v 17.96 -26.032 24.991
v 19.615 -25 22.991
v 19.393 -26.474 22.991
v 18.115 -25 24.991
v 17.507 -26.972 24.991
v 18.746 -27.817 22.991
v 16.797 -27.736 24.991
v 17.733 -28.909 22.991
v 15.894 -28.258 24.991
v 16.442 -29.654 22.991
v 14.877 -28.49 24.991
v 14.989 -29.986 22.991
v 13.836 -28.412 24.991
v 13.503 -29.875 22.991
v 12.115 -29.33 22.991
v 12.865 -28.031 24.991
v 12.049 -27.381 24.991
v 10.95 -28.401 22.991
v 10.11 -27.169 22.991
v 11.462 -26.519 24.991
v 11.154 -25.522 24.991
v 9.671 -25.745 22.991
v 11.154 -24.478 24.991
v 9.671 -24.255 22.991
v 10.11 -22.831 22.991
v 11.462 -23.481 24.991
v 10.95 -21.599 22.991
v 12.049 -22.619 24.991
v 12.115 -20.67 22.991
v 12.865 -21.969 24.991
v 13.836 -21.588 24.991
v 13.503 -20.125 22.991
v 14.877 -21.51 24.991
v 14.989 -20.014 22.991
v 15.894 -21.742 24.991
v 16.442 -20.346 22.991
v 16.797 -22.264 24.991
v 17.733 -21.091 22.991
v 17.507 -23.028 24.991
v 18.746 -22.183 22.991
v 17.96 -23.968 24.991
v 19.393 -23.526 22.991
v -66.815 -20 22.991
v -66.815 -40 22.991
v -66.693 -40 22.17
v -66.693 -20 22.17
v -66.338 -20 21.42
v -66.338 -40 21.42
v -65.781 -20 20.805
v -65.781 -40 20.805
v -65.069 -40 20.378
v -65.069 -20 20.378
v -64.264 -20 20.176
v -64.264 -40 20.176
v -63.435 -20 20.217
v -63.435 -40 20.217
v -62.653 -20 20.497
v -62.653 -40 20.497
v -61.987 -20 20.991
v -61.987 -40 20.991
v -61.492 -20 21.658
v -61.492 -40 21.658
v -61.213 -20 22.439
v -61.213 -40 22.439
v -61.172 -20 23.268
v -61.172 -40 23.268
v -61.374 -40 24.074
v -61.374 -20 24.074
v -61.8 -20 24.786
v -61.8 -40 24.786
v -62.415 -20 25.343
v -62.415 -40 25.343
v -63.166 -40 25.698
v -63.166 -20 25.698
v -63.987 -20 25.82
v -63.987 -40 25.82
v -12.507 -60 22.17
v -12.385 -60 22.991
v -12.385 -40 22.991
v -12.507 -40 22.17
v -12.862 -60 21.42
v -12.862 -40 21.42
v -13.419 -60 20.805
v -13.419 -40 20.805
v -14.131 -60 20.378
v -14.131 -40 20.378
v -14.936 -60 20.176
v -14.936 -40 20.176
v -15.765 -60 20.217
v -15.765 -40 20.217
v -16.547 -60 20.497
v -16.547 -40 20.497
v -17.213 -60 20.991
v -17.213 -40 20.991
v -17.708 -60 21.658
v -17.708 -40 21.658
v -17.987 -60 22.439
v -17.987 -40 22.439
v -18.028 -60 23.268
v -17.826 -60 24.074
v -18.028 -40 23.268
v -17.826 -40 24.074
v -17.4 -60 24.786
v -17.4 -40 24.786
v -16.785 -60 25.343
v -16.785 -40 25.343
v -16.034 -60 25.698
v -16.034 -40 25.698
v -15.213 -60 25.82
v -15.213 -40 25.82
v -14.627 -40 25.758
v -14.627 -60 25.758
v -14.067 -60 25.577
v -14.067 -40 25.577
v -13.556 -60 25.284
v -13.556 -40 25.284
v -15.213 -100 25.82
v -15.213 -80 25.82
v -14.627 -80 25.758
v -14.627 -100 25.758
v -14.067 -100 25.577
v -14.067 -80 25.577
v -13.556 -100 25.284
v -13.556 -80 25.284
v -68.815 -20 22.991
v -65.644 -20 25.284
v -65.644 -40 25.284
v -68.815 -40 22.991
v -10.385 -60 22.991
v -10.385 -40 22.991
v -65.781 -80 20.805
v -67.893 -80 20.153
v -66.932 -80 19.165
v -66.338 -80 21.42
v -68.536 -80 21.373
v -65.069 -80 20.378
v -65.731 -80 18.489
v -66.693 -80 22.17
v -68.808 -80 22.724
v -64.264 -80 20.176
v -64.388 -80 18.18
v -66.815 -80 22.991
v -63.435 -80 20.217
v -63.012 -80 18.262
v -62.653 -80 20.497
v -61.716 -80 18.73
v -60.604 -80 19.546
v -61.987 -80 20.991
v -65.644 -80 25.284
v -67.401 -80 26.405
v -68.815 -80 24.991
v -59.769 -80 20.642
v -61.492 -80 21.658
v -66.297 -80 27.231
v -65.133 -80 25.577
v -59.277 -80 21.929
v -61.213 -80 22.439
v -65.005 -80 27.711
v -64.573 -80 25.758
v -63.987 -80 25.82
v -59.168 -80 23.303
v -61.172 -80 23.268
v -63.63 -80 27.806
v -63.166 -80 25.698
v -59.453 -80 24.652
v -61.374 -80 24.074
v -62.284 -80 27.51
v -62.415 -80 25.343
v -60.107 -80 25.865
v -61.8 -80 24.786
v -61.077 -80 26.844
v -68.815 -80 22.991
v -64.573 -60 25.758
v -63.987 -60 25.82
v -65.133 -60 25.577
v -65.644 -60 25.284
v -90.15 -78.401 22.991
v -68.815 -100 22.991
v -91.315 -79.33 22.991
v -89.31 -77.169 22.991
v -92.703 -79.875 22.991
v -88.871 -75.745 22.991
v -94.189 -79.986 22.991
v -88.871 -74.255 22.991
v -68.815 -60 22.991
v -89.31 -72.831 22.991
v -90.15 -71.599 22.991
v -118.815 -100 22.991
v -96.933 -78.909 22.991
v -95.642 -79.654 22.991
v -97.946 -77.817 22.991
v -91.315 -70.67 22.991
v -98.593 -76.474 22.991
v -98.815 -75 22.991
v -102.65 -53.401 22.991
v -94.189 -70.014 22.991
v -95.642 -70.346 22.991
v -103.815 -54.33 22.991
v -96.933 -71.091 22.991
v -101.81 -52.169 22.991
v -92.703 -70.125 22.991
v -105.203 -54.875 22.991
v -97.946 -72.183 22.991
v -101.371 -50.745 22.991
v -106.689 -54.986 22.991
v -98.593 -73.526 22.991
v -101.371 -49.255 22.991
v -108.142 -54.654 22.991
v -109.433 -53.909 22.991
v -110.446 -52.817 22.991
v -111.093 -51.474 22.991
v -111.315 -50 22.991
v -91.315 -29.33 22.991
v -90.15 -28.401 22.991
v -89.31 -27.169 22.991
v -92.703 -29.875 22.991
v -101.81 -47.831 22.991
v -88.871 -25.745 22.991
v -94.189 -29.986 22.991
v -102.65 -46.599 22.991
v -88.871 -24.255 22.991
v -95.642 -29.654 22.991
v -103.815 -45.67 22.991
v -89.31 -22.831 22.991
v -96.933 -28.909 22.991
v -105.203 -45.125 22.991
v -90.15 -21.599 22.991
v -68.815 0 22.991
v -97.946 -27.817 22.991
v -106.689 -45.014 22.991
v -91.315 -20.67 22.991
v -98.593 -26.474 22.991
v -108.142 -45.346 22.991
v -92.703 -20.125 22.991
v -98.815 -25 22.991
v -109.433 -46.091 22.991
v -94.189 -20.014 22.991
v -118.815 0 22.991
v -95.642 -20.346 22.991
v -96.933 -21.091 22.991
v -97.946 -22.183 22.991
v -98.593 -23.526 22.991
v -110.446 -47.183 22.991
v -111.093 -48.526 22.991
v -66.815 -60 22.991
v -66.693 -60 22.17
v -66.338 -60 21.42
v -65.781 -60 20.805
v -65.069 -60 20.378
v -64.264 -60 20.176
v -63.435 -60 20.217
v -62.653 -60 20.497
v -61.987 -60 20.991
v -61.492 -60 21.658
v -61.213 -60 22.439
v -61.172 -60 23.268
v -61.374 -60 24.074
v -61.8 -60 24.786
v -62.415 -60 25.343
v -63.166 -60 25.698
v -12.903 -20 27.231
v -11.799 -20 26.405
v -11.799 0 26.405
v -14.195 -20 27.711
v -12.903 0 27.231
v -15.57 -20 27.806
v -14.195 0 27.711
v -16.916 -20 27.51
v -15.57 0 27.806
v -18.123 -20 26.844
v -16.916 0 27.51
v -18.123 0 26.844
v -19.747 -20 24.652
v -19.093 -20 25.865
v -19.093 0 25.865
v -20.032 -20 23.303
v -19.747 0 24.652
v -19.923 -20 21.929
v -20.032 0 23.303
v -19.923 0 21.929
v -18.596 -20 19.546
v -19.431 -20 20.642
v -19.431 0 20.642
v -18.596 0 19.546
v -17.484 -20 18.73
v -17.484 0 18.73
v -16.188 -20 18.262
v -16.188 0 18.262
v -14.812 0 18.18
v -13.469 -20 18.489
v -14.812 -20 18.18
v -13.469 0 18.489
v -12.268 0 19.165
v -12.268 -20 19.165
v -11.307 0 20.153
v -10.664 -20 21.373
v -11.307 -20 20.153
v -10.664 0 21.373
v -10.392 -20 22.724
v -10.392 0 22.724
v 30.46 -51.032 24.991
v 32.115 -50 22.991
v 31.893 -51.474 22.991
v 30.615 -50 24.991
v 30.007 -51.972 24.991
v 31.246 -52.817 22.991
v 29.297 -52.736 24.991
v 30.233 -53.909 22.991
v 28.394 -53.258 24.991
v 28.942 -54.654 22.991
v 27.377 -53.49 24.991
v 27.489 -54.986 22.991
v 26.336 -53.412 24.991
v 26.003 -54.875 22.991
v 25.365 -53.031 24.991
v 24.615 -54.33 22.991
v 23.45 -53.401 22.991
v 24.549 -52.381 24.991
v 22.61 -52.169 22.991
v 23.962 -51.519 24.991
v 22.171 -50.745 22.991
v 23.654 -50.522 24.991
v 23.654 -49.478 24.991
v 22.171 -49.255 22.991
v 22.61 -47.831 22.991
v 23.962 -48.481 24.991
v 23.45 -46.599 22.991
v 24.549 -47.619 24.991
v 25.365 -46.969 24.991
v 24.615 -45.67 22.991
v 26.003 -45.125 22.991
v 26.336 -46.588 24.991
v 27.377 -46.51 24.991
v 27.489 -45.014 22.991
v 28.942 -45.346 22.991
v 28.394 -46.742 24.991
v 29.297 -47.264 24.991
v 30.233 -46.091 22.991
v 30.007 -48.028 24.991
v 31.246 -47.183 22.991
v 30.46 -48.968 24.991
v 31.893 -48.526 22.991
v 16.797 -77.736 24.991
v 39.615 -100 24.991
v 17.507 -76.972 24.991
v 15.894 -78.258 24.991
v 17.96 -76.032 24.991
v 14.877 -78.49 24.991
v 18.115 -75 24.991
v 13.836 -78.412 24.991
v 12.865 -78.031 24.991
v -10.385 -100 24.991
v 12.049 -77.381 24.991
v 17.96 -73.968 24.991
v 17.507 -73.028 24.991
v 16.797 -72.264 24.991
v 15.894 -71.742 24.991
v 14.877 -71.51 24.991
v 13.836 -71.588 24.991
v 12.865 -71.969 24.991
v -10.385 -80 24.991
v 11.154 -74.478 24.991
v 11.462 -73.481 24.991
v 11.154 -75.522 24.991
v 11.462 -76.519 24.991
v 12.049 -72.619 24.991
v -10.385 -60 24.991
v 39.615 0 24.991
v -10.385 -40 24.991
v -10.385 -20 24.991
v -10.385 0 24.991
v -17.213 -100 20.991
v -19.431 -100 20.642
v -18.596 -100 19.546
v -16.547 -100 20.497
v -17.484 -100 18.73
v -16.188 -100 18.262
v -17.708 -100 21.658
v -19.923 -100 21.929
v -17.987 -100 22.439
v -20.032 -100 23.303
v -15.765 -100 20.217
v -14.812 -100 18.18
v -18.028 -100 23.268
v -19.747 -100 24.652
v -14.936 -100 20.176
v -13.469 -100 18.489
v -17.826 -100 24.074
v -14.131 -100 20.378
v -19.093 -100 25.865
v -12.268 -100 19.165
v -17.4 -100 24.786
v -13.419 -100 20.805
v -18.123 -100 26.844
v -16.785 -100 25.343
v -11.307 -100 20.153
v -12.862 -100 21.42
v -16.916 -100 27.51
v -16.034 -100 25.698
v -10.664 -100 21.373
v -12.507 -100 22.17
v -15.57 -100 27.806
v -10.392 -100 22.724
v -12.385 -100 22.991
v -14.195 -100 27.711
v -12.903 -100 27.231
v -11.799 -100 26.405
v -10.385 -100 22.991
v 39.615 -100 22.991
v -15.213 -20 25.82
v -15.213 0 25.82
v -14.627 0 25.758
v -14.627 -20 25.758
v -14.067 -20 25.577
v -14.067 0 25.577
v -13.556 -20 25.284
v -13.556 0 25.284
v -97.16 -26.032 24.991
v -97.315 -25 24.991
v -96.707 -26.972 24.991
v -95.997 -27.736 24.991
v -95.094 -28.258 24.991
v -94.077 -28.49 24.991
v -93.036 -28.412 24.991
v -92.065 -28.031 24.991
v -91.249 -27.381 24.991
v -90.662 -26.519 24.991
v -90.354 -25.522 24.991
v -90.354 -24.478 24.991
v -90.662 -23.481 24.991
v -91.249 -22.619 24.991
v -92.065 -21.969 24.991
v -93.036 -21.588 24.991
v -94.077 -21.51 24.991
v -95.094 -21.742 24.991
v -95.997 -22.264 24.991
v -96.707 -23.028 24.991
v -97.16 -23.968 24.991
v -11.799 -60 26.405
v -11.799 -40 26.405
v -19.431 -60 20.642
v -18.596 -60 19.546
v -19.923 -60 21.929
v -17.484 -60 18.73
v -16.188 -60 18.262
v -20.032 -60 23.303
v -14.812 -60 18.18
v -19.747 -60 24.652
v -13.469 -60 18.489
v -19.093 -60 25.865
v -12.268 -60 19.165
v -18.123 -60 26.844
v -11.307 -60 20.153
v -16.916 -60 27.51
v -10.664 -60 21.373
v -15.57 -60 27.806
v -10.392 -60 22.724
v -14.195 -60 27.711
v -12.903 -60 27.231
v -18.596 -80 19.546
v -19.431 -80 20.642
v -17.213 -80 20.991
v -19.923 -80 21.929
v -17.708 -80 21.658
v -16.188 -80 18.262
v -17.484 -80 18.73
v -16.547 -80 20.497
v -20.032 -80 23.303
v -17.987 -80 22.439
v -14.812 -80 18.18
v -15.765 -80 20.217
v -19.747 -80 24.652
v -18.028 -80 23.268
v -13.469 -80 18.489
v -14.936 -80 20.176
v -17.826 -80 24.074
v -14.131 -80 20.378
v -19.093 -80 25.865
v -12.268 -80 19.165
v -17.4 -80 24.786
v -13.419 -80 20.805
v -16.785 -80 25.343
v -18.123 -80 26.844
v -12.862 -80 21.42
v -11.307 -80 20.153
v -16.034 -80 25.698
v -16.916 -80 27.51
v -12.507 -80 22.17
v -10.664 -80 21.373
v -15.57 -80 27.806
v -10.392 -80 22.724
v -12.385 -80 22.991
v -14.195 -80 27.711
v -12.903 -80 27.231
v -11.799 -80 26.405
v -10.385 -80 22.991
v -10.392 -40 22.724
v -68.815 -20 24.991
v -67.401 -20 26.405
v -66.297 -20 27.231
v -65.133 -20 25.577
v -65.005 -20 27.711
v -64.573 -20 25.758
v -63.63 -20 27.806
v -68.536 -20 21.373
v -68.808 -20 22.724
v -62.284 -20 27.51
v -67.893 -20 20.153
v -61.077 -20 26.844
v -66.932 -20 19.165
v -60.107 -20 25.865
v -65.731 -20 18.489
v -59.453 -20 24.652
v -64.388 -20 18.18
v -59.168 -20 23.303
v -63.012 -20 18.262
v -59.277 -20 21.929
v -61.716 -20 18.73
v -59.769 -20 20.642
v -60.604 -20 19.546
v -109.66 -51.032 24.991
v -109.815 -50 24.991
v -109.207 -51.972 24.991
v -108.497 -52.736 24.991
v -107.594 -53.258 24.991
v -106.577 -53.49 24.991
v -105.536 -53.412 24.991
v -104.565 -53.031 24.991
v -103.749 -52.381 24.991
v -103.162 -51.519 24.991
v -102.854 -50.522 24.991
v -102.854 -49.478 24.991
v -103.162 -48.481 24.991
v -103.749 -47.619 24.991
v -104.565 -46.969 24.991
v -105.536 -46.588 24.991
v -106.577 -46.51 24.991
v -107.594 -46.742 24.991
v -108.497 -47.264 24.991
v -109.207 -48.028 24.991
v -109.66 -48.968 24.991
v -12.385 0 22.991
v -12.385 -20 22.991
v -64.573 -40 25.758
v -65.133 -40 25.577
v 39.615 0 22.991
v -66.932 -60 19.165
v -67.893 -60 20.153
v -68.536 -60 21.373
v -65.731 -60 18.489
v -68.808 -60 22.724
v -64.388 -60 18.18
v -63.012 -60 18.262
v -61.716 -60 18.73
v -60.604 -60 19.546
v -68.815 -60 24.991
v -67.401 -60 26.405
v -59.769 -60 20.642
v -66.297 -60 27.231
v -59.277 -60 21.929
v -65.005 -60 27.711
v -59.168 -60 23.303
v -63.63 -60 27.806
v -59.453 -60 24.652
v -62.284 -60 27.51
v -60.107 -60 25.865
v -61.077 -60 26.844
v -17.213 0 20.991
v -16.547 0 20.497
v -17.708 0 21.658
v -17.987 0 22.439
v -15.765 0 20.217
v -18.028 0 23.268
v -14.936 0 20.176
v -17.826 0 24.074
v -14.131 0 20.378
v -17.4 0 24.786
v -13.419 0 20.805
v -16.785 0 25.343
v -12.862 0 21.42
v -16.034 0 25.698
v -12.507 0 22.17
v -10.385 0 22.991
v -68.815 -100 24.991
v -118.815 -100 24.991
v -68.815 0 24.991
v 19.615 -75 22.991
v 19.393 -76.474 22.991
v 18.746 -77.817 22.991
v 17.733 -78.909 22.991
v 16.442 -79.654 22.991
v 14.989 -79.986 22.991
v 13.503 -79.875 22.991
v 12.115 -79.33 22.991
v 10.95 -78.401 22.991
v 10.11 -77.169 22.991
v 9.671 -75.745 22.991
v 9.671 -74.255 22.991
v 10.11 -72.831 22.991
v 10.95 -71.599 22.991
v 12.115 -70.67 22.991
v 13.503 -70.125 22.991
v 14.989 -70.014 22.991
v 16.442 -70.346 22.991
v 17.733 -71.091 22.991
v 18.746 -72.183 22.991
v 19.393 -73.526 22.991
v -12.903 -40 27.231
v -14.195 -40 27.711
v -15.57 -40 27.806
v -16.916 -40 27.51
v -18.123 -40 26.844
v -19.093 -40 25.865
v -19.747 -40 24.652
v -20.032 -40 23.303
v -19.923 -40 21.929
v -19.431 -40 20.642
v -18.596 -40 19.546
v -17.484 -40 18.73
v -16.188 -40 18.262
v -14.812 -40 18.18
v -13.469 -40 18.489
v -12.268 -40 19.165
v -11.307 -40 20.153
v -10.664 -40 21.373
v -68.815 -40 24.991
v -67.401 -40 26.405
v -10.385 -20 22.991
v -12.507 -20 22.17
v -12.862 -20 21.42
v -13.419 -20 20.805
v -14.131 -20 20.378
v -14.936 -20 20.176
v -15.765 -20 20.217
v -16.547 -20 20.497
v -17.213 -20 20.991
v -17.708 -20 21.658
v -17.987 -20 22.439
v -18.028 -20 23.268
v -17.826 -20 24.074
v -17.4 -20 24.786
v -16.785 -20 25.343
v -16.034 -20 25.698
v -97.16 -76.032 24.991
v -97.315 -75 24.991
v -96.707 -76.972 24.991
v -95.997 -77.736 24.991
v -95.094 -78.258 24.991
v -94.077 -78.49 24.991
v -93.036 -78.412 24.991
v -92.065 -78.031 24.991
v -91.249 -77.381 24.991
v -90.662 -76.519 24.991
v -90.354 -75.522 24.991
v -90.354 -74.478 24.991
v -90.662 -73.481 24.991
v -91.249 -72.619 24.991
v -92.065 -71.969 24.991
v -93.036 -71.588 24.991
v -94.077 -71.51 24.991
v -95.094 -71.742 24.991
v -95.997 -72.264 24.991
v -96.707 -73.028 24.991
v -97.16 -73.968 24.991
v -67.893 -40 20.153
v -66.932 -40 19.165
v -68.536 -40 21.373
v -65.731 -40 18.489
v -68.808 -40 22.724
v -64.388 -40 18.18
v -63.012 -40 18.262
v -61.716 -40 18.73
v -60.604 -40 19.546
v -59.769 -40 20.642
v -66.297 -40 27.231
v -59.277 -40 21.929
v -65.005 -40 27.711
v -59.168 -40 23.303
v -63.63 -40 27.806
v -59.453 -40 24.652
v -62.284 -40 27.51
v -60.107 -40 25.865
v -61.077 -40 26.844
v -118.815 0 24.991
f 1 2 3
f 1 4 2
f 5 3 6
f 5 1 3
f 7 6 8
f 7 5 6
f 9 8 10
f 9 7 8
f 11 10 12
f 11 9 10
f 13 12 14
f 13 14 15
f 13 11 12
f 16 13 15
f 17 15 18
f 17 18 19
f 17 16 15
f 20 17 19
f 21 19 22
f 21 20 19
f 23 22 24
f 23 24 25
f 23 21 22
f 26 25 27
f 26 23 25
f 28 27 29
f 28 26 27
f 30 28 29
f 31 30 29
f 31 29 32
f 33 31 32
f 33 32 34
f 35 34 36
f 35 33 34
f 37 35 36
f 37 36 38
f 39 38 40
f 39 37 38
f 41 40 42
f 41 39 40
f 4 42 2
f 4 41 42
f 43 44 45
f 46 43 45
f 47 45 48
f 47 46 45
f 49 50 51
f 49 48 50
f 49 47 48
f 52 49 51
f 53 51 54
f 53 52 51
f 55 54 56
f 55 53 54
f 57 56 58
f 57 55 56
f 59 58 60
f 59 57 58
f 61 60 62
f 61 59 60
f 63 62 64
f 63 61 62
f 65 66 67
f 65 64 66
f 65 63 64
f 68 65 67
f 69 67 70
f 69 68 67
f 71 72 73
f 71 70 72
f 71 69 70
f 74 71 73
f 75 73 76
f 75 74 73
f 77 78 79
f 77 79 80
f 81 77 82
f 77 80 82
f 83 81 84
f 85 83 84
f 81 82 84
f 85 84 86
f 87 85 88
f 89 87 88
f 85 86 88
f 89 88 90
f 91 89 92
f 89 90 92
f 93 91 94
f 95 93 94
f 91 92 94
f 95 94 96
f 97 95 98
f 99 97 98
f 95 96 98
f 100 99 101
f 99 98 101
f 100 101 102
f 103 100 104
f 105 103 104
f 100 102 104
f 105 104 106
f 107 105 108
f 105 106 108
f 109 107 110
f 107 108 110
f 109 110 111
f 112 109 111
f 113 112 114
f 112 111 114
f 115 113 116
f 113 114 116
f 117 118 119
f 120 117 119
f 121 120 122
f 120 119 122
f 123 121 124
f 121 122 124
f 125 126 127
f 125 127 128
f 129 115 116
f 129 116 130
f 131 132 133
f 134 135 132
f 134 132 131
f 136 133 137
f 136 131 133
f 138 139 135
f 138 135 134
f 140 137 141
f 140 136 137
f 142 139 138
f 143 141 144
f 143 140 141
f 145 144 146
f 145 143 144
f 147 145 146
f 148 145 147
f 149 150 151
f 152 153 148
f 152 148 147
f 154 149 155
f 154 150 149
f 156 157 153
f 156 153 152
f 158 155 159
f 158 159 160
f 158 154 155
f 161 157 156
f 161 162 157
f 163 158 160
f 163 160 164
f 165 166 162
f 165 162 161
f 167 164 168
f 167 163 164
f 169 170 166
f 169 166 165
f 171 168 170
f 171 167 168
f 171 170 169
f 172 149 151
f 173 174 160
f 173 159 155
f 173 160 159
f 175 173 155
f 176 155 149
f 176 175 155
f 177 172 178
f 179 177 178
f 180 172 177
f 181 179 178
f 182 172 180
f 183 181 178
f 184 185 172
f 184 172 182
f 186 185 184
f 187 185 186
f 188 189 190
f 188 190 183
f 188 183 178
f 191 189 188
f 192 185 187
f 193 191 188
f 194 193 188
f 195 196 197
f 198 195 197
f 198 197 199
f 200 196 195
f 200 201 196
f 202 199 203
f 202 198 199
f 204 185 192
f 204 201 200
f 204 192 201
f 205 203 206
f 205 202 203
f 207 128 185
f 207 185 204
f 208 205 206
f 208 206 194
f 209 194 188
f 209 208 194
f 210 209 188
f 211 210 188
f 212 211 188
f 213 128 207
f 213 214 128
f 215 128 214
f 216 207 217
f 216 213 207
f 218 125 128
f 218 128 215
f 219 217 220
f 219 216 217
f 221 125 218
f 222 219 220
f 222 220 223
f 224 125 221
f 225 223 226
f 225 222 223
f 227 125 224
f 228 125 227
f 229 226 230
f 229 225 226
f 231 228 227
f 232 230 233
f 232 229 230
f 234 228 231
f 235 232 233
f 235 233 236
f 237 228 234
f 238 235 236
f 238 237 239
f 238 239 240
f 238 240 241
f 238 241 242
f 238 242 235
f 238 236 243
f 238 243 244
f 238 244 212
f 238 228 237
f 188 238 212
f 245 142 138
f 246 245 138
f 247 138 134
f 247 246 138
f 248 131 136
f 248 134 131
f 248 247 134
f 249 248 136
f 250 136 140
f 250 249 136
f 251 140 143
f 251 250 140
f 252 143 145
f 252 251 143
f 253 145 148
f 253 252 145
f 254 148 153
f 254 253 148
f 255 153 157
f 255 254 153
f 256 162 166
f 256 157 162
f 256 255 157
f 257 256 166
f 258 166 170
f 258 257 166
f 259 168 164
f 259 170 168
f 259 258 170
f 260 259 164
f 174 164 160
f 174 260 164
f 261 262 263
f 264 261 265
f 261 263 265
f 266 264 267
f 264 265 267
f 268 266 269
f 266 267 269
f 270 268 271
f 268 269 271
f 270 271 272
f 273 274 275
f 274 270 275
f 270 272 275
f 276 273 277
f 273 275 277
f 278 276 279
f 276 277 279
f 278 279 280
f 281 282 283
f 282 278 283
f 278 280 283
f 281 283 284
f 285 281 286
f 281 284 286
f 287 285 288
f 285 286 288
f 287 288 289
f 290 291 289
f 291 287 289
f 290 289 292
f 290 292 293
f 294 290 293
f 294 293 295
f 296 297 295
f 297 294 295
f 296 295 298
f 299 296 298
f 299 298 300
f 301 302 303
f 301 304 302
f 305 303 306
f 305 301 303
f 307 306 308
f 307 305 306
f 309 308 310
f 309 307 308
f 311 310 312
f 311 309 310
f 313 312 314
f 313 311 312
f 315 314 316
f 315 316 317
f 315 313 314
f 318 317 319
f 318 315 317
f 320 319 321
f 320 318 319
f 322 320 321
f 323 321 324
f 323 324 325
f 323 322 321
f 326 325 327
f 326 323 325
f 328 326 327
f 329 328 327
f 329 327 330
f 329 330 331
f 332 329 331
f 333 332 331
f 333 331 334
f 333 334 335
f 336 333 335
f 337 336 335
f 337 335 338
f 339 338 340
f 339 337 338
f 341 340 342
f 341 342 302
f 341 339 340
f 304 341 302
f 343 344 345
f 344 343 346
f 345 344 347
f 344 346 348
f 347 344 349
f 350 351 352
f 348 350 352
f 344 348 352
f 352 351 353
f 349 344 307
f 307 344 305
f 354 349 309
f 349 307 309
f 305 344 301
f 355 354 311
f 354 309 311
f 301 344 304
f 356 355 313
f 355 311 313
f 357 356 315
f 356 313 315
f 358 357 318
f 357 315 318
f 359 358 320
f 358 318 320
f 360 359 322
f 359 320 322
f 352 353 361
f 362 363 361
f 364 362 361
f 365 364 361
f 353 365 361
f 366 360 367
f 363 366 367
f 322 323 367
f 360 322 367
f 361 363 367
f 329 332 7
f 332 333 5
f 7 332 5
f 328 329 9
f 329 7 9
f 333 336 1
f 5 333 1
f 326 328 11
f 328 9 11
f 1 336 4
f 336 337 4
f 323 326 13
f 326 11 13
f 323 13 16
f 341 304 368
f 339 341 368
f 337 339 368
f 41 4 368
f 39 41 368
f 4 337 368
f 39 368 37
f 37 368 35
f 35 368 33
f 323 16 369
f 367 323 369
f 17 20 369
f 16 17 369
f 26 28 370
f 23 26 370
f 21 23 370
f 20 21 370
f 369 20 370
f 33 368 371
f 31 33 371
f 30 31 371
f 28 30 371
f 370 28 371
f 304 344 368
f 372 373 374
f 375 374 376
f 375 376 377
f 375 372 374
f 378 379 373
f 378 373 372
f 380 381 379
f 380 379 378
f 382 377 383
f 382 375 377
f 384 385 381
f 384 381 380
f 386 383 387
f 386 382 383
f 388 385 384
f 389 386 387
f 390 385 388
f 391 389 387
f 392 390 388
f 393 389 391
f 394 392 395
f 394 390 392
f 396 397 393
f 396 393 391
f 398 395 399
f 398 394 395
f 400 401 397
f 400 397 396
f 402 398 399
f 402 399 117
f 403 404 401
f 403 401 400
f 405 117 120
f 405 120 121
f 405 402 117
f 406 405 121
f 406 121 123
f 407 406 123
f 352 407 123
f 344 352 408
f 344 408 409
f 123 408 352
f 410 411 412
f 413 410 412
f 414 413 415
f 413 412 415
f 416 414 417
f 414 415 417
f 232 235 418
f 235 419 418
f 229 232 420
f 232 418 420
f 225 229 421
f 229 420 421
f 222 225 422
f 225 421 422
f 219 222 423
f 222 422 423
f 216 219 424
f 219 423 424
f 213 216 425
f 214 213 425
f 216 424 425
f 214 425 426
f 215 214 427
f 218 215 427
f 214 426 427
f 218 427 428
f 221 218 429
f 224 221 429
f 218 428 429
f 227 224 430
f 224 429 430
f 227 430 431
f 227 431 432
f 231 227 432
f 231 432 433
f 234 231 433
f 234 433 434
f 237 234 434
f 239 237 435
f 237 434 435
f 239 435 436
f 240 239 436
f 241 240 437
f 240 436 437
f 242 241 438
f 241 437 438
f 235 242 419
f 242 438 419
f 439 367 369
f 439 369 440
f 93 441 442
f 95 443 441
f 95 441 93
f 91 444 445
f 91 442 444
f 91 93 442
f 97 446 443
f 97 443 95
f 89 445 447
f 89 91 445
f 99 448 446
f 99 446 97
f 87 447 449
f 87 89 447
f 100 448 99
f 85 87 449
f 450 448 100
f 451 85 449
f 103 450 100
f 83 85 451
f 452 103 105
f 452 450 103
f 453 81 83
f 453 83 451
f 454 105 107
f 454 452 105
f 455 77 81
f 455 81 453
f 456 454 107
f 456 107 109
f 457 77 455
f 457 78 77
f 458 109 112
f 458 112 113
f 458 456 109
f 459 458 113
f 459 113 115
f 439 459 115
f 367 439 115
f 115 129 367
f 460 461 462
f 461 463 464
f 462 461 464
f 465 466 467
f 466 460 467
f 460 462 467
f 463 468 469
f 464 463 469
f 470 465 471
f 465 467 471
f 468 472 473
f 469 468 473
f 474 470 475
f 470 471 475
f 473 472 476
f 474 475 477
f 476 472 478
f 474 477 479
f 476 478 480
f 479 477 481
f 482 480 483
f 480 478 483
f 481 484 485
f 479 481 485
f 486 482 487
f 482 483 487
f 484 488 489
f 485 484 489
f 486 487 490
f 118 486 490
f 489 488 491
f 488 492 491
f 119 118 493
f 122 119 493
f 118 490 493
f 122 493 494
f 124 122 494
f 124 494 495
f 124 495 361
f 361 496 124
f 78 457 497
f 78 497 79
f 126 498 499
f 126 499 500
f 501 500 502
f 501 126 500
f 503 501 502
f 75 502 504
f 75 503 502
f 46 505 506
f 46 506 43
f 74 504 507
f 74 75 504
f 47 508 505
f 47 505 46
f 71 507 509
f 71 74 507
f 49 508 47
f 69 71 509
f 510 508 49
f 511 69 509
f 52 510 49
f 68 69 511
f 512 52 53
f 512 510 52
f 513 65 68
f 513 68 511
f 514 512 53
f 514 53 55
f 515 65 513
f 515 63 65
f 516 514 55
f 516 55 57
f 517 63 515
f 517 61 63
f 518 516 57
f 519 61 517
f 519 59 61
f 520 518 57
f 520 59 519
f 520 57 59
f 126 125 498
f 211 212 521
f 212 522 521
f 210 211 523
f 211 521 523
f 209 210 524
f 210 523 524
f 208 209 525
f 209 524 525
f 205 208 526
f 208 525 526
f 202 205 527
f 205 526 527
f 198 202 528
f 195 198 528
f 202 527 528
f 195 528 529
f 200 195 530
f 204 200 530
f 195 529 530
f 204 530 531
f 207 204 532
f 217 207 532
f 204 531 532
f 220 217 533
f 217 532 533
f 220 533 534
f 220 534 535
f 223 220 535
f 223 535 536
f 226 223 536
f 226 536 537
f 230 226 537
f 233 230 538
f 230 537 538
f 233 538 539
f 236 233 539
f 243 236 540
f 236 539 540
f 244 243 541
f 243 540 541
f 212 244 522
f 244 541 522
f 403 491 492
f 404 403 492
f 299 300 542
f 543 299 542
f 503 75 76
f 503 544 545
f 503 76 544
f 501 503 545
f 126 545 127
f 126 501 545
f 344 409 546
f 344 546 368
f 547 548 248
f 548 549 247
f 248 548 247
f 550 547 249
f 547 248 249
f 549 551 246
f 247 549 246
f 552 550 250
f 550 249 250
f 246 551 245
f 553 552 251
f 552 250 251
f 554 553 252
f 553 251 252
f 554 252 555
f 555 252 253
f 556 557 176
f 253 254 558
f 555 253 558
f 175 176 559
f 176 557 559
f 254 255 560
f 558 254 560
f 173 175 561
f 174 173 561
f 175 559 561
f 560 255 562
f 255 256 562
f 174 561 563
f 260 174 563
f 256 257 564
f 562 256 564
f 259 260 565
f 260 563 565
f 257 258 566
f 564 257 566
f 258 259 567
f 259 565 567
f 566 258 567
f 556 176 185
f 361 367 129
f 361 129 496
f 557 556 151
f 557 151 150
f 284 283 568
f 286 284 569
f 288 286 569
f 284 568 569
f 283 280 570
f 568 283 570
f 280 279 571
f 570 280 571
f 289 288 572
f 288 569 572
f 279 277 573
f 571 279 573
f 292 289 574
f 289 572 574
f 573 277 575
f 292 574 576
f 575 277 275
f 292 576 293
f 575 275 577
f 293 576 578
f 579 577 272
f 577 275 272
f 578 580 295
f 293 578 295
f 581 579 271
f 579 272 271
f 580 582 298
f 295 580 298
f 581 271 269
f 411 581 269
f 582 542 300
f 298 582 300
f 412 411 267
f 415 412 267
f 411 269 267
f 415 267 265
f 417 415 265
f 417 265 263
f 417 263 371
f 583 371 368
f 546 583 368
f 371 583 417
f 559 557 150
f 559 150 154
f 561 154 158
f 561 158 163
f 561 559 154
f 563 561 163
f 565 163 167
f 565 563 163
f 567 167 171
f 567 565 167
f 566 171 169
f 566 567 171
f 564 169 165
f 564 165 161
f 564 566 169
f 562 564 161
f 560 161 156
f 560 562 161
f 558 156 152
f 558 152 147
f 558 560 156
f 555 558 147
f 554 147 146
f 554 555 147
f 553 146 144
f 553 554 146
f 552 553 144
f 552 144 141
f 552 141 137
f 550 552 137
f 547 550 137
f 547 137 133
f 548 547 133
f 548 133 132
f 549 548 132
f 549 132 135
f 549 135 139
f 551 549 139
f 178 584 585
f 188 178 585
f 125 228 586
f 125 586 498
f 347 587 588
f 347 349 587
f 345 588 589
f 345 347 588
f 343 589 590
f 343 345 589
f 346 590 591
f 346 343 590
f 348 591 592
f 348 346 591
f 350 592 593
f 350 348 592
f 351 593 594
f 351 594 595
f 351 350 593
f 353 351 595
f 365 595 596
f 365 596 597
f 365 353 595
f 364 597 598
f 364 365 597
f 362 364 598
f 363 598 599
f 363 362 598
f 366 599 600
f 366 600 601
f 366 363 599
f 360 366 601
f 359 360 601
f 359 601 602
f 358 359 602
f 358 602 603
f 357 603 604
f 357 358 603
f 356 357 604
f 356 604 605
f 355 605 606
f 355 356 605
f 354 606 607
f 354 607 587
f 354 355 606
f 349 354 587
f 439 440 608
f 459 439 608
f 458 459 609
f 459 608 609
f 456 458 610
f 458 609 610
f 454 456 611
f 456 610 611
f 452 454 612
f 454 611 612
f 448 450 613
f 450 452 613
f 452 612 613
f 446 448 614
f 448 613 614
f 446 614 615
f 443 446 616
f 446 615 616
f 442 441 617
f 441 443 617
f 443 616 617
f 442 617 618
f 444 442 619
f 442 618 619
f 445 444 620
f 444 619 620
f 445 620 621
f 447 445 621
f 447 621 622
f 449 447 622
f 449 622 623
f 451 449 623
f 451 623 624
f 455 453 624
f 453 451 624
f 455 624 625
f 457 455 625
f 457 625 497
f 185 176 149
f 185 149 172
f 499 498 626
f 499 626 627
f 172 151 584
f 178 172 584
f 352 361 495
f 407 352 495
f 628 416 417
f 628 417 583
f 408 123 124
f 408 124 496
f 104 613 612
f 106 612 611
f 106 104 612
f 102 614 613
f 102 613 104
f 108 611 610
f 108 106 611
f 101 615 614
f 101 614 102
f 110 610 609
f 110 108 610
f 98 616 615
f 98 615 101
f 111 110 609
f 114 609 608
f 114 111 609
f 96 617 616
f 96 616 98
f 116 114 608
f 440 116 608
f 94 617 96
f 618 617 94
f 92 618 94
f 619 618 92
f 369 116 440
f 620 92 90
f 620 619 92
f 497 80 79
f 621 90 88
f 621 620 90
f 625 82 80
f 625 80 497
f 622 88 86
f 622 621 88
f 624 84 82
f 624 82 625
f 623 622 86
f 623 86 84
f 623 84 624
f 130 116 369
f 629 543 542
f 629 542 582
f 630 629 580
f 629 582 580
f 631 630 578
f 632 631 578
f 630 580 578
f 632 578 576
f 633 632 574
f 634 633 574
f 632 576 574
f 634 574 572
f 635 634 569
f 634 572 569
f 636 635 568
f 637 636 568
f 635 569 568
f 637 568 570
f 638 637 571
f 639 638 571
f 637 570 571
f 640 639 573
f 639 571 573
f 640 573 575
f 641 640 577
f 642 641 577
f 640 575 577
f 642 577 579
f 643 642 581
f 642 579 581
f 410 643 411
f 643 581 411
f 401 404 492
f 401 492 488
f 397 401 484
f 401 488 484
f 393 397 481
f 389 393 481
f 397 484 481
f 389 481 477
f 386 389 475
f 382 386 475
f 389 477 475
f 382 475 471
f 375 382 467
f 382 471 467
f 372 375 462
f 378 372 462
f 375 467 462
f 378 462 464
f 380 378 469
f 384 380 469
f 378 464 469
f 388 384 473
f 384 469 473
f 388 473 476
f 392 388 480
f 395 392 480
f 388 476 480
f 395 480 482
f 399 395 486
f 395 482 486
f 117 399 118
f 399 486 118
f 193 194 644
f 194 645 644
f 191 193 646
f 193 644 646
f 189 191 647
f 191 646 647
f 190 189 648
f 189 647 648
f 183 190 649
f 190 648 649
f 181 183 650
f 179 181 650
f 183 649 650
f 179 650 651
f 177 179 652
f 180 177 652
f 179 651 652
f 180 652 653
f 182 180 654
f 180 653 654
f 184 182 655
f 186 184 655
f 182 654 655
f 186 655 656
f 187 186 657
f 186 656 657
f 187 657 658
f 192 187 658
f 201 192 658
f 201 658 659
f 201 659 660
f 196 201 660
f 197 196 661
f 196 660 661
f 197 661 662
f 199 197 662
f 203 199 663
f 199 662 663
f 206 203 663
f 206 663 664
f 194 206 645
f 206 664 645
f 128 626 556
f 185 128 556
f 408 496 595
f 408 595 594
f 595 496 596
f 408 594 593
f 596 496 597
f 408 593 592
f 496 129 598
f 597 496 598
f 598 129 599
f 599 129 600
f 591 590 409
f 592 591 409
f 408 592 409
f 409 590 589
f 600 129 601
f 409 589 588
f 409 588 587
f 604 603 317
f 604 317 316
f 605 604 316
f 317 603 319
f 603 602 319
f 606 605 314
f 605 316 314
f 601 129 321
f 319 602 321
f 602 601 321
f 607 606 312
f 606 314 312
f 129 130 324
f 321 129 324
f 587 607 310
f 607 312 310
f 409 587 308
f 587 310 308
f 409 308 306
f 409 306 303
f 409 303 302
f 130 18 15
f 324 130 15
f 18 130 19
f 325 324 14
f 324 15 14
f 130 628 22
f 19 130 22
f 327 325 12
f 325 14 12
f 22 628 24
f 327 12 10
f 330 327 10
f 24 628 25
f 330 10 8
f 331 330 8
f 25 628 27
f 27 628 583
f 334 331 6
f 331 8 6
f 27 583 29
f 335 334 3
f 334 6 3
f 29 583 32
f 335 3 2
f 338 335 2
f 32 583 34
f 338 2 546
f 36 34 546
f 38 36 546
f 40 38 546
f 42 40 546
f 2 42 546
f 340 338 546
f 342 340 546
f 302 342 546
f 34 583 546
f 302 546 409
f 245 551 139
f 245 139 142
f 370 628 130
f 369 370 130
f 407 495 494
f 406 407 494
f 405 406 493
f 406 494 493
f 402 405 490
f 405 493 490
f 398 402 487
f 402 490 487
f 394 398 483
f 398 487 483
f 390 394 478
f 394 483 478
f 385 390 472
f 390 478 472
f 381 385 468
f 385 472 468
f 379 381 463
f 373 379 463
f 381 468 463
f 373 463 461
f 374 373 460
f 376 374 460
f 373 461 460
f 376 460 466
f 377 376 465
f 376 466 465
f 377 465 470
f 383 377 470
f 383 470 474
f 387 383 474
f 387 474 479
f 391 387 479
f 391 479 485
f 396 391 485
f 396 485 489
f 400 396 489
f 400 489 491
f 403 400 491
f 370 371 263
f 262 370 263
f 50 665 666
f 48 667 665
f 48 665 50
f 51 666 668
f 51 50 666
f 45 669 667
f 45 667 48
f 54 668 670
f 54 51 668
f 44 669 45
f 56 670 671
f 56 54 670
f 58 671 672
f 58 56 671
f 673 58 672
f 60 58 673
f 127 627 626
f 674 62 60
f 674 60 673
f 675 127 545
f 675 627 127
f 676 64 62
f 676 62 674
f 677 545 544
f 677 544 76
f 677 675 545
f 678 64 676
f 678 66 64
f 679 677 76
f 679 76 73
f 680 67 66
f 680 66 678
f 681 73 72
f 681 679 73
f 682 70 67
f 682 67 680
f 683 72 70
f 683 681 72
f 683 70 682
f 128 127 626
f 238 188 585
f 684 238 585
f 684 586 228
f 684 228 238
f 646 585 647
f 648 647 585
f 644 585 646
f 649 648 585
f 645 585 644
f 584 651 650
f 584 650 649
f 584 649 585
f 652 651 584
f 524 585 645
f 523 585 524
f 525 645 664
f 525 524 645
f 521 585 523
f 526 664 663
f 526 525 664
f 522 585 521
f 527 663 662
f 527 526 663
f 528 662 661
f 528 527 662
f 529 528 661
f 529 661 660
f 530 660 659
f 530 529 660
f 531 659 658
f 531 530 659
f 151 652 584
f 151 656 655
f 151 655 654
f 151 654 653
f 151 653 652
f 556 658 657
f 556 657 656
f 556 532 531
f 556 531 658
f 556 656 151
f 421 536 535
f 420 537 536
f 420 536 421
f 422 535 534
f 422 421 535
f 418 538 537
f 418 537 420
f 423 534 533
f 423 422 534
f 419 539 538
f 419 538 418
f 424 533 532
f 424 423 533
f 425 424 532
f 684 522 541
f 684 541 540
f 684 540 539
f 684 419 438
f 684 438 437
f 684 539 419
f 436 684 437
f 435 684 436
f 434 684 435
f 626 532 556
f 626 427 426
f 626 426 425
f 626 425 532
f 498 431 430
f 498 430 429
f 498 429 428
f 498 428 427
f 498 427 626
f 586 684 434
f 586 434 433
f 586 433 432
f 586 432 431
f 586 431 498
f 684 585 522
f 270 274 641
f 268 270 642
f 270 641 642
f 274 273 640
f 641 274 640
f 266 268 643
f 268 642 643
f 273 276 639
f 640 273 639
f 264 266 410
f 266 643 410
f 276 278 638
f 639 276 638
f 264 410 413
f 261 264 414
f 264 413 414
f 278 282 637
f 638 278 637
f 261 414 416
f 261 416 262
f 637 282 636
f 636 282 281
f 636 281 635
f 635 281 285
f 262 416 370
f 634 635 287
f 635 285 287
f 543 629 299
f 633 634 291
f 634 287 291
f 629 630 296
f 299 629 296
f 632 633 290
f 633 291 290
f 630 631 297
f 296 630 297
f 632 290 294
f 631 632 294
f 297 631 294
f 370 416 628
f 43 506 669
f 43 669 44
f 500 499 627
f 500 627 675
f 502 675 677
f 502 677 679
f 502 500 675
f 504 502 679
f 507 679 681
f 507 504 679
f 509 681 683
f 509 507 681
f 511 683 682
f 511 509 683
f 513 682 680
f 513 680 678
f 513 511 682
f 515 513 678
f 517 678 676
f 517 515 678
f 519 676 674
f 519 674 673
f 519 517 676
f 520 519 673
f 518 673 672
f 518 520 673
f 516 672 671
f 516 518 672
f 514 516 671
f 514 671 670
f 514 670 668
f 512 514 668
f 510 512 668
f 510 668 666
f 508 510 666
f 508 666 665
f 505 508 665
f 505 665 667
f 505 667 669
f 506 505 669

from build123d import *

# Parameters (mm, degrees)
F1_DEPTH  = 100
F2_R      = 5
F3_R      = 3.5
F10_W     = 20
F10_H     = 20
F11_DEPTH = 12.5
F12_DEPTH = 12.5


with BuildPart() as f1:
    # F0 (on Front) → F1 (new body)
    with BuildSketch(Plane.XZ):
        with BuildLine():
            Line((39.6151453722, 24.9912568834), (-10.3848546278, 24.9912568834))
            Line((-10.3848546278, 24.9912568834), (-11.7990681902, 26.4054704458))
            ThreePointArc((-11.7990681902, 26.4054704458), (-19.7236384627, 21.2677746973), (-10.392264395, 22.7238617881))
            Line((-10.392264395, 22.7238617881), (-12.3848546278, 22.9912568834))
            ThreePointArc((-12.3848546278, 22.9912568834), (-17.2132817525, 20.9912568834), (-15.2132817525, 25.8196840081))
            ThreePointArc((-15.2132817525, 25.8196840081), (-14.3425704396, 25.6823276386), (-13.556427503, 25.2835993525))
            Line((-13.556427503, 25.2835993525), (-10.3848546278, 22.9912568834))
            Line((-10.3848546278, 22.9912568834), (39.6151453722, 22.9912568834))
            Line((39.6151453722, 22.9912568834), (39.6151453722, 24.9912568834))
        make_face()
    extrude(amount=F1_DEPTH)

    # F2 (on face) → F4 section 0
    with BuildSketch(Plane(origin=(0, 0, 22.9912568834), x_dir=(1, 0, 0), z_dir=(0, 0, -1))):
        with Locations((14.6151453722, 75)):
            Circle(F2_R)
    # F3 (on face) → F4 section 1
    with BuildSketch(Plane.XY.offset(24.9912568834)):
        with Locations((14.6151453722, -75)):
            Circle(F3_R)
    loft(mode=Mode.SUBTRACT)

    # F2 (on face) → F5 section 0
    with BuildSketch(Plane(origin=(0, 0, 22.9912568834), x_dir=(1, 0, 0), z_dir=(0, 0, -1))):
        with Locations((27.1151453722, 50)):
            Circle(F2_R)
    # F3 (on face) → F5 section 1
    with BuildSketch(Plane.XY.offset(24.9912568834)):
        with Locations((27.1151453722, -50)):
            Circle(F3_R)
    loft(mode=Mode.SUBTRACT)

    # F2 (on face) → F6 section 0
    with BuildSketch(Plane(origin=(0, 0, 22.9912568834), x_dir=(1, 0, 0), z_dir=(0, 0, -1))):
        with Locations((14.6151453722, 25)):
            Circle(F2_R)
    # F3 (on face) → F6 section 1
    with BuildSketch(Plane.XY.offset(24.9912568834)):
        with Locations((14.6151453722, -25)):
            Circle(F3_R)
    loft(mode=Mode.SUBTRACT)


with BuildPart() as f8_1:
    # F8: instance of F1
    add(f1.part.mirror(Plane.YZ.offset(-39.6)))

    # F10 (on offset) → F11 (cut, symmetric)
    with BuildSketch(Plane(origin=(0, 0, 22.3912568834), x_dir=(1, 0, 0), z_dir=(0, 0, -1))):
        with Locations((-58.8151453722, 90)):
            Rectangle(F10_W, F10_H)
        with Locations((-58.8151453722, 50)):
            Rectangle(F10_W, F10_H)
        with Locations((-58.8151453722, 10)):
            Rectangle(F10_W, F10_H)
    extrude(amount=F11_DEPTH, both=True, mode=Mode.SUBTRACT)


with BuildPart() as f1_1:
    add(f1.part)

    # F10 (on offset) → F12 (cut, symmetric)
    with BuildSketch(Plane(origin=(0, 0, 22.3912568834), x_dir=(1, 0, 0), z_dir=(0, 0, -1))):
        with Locations((-20.3848546278, 70)):
            Rectangle(F10_W, F10_H)
        with Locations((-20.3848546278, 30)):
            Rectangle(F10_W, F10_H)
    extrude(amount=F12_DEPTH, both=True, mode=Mode.SUBTRACT)


solid = Compound([f8_1.part, f1_1.part])
